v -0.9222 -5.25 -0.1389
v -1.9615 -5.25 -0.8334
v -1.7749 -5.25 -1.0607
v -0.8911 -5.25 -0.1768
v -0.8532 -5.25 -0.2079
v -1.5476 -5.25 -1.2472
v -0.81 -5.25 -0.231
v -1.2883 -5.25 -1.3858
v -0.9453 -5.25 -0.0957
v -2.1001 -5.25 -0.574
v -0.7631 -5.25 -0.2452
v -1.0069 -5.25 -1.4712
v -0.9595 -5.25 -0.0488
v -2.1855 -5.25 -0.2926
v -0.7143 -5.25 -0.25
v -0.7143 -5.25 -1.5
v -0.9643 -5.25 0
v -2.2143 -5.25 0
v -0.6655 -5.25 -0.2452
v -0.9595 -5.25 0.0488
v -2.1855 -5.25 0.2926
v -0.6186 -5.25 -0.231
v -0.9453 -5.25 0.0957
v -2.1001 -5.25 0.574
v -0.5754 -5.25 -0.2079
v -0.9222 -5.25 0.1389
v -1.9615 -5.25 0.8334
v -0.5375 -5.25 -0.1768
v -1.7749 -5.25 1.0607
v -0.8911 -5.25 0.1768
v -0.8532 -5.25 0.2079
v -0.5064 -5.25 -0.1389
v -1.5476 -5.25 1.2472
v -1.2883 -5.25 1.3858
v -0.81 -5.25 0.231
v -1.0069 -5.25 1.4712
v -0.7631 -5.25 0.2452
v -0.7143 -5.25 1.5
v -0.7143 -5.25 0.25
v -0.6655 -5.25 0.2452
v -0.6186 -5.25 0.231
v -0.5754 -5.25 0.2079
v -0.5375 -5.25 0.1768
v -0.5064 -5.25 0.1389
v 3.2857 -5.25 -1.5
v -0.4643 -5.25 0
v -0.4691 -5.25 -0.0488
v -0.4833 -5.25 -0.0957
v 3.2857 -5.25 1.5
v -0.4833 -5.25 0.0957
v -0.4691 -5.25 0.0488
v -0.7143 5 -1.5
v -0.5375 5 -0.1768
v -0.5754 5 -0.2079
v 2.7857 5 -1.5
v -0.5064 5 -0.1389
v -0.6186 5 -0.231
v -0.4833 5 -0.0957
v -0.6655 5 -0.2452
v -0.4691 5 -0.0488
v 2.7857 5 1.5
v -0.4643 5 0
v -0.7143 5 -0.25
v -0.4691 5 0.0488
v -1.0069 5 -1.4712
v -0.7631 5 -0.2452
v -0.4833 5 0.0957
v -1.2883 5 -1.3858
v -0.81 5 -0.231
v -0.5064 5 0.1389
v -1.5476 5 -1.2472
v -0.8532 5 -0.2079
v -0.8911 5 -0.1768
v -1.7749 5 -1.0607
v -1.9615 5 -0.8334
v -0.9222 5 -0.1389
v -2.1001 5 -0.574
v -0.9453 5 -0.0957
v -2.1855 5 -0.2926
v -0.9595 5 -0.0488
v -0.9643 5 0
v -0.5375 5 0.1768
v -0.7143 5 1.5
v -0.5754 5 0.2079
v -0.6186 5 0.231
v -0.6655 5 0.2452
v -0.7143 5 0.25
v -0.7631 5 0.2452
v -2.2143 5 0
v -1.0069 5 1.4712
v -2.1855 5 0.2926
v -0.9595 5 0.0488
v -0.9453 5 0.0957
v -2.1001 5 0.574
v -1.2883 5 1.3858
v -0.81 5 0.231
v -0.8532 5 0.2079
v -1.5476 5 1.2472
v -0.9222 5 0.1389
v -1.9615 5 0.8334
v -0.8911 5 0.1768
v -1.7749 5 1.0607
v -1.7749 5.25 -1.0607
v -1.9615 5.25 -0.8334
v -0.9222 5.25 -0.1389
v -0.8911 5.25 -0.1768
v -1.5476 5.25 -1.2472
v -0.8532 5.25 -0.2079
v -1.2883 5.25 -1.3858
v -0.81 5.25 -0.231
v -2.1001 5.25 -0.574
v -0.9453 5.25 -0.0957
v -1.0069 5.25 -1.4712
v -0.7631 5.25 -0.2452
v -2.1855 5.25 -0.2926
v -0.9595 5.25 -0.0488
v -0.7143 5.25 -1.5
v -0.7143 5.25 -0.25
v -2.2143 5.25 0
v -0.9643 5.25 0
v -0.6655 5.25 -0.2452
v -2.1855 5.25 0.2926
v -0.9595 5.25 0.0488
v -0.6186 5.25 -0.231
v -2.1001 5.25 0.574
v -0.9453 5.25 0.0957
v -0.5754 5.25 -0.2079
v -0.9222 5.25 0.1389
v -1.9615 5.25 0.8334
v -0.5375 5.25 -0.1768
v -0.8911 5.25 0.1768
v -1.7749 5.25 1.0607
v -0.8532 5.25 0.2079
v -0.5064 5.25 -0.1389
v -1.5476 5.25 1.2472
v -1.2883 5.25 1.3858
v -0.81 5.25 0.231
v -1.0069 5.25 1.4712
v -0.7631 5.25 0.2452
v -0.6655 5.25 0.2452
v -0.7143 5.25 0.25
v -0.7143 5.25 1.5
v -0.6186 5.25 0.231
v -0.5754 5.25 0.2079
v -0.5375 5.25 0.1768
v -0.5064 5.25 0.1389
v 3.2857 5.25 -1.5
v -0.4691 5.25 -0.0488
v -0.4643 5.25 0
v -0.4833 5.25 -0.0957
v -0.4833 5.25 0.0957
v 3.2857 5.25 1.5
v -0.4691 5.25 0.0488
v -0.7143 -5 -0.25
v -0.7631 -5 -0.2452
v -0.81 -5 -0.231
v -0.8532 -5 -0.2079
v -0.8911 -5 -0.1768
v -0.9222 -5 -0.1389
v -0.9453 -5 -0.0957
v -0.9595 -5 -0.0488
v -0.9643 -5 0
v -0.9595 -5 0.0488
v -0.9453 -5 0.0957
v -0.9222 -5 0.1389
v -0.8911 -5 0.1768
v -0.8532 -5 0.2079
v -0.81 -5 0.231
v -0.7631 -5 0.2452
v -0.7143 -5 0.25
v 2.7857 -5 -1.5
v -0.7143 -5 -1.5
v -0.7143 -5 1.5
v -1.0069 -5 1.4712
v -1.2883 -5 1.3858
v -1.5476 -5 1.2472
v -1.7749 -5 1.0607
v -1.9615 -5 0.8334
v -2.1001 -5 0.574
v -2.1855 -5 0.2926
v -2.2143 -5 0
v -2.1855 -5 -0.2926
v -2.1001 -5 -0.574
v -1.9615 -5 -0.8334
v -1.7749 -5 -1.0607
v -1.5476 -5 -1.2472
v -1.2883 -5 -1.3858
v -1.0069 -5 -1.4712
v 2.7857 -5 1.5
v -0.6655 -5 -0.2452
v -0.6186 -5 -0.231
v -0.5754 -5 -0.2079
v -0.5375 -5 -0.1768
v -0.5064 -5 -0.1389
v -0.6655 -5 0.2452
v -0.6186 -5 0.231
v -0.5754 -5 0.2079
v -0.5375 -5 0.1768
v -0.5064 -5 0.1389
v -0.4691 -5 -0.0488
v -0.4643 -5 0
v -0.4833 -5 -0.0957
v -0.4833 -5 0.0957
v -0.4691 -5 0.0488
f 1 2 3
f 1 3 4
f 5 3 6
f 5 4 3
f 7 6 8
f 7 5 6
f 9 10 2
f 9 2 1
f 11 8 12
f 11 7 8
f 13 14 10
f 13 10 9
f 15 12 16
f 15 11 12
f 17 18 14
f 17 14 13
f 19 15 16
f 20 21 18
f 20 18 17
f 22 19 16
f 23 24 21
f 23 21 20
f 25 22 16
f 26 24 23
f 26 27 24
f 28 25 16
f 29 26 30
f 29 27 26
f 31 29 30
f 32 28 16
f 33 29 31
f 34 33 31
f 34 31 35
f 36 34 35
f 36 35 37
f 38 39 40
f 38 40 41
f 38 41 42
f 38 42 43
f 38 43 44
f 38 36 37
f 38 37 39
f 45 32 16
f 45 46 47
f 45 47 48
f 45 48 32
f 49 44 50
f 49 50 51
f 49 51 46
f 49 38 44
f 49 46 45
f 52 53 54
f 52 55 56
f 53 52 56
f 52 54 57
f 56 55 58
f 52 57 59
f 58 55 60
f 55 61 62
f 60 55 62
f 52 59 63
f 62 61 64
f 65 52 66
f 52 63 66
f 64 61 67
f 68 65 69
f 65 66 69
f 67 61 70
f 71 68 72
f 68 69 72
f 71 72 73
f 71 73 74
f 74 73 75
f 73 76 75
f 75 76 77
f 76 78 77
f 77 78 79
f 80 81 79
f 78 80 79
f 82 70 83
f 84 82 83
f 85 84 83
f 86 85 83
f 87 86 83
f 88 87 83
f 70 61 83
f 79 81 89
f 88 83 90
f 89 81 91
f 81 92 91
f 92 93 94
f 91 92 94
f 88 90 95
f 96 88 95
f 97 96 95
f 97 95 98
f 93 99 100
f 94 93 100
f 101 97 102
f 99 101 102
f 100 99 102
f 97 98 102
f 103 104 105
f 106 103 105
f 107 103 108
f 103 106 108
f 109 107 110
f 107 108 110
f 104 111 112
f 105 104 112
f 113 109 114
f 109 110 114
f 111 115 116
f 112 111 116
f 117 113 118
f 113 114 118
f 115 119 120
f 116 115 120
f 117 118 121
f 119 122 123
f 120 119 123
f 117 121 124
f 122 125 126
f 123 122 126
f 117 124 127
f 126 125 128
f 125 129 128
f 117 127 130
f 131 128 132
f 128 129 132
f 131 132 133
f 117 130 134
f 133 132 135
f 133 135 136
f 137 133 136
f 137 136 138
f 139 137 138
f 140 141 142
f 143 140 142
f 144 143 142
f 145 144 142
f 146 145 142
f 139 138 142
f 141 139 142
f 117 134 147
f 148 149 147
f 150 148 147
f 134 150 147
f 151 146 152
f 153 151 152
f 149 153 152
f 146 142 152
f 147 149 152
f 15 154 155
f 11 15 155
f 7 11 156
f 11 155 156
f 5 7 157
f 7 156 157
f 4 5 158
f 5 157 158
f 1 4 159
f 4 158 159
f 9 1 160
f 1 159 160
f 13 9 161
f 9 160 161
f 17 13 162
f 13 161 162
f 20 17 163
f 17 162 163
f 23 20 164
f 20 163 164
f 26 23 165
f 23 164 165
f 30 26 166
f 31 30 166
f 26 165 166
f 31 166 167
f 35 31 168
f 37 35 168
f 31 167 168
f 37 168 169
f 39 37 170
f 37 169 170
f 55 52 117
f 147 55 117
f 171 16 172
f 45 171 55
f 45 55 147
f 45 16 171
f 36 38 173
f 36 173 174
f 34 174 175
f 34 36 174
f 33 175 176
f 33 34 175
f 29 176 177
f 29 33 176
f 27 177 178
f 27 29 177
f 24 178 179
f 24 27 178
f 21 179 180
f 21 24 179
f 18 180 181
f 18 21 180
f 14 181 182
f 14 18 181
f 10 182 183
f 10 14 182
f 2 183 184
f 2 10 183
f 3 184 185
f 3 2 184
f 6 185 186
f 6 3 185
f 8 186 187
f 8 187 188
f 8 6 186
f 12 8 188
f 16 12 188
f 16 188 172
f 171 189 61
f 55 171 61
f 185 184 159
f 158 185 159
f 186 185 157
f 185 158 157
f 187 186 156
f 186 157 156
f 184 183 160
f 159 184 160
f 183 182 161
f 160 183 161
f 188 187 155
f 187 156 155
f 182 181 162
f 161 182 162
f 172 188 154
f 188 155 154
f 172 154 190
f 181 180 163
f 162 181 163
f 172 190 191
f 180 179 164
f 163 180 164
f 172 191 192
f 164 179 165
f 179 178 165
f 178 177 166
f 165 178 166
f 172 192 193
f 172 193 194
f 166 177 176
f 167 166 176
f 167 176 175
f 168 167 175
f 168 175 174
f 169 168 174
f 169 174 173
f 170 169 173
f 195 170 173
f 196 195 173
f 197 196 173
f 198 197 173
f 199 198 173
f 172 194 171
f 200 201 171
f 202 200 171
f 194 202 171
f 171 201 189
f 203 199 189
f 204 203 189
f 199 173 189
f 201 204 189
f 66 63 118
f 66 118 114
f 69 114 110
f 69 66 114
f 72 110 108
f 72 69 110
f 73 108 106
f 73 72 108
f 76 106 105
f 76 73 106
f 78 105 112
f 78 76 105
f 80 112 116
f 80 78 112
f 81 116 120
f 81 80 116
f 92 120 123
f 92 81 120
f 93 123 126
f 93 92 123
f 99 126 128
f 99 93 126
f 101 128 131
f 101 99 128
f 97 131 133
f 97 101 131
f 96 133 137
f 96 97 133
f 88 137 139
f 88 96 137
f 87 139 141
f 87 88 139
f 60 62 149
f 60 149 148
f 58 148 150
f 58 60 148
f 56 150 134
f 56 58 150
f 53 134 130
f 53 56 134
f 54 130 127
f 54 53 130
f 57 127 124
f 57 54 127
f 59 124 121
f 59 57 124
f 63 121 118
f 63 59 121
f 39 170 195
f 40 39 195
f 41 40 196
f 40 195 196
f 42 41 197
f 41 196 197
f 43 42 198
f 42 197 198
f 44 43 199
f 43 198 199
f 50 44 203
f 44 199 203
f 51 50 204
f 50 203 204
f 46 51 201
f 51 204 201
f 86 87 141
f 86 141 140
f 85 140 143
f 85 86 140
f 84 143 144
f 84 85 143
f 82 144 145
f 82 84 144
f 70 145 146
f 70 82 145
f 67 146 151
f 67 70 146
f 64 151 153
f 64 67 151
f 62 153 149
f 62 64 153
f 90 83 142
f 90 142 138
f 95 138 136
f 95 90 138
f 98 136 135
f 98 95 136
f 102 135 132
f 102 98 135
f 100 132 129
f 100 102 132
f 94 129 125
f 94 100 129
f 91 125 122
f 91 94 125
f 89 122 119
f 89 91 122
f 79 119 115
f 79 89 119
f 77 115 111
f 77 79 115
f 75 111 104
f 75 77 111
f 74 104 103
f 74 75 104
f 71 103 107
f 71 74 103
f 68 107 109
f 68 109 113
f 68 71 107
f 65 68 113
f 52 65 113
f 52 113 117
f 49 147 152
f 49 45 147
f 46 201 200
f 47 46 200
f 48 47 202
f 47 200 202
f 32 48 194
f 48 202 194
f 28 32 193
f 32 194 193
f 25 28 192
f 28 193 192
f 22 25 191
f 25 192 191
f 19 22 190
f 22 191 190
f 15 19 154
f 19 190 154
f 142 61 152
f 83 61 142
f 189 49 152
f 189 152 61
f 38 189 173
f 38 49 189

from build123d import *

# Parameters (mm, degrees)
F1_DEPTH = 5.25
F2_W     = 3.5
F2_H     = 10
F2_W_2   = 2.3031880188
F3_DEPTH = 5


with BuildPart() as f1:
    # F0 (on Front) → F1 (new body, symmetric)
    with BuildSketch(Plane.XZ):
        with BuildLine():
            Line((3.2857142857, 1.5), (-0.7142857143, 1.5))
            ThreePointArc((-0.7142857143, 1.5), (0.3463744575, 1.0606601718), (0.7857142857, 0))
            ThreePointArc((0.7857142857, 0), (0.3463744575, -1.0606601718), (-0.7142857143, -1.5))
            Line((-0.7142857143, -1.5), (3.2857142857, -1.5))
            Line((3.2857142857, -1.5), (3.2857142857, 1.5))
        make_face()
        with BuildLine():
            ThreePointArc((0.7857142857, 0), (0.3463744575, 1.0606601718), (-0.7142857143, 1.5))
            Line((-0.7142857143, 1.5), (-0.7142857143, 0.25))
            ThreePointArc((-0.7142857143, 0.25), (-0.537509019, 0.1767766953), (-0.4642857143, 0))
            ThreePointArc((-0.4642857143, 0), (-0.537509019, -0.1767766953), (-0.7142857143, -0.25))
            Line((-0.7142857143, -0.25), (-0.7142857143, -1.5))
            ThreePointArc((-0.7142857143, -1.5), (0.3463744575, -1.0606601718), (0.7857142857, 0))
        make_face()
        with BuildLine():
            Line((-0.7142857143, 0.25), (-0.7142857143, 1.5))
            ThreePointArc((-0.7142857143, 1.5), (-2.2142857143, 0), (-0.7142857143, -1.5))
            Line((-0.7142857143, -1.5), (-0.7142857143, -0.25))
            ThreePointArc((-0.7142857143, -0.25), (-0.9642857143, 0), (-0.7142857143, 0.25))
        make_face()
    extrude(amount=F1_DEPTH, both=True)

    # F2 (on face) → F3 (cut, symmetric)
    with BuildSketch(Plane.XY.offset(1.5)):
        with Locations((1.0357142857, 0)):
            Rectangle(F2_W, F2_H)
        with Locations((-1.8658797237, 0)):
            Rectangle(F2_W_2, F2_H)
    extrude(amount=F3_DEPTH, both=True, mode=Mode.SUBTRACT)


solid = f1.part
